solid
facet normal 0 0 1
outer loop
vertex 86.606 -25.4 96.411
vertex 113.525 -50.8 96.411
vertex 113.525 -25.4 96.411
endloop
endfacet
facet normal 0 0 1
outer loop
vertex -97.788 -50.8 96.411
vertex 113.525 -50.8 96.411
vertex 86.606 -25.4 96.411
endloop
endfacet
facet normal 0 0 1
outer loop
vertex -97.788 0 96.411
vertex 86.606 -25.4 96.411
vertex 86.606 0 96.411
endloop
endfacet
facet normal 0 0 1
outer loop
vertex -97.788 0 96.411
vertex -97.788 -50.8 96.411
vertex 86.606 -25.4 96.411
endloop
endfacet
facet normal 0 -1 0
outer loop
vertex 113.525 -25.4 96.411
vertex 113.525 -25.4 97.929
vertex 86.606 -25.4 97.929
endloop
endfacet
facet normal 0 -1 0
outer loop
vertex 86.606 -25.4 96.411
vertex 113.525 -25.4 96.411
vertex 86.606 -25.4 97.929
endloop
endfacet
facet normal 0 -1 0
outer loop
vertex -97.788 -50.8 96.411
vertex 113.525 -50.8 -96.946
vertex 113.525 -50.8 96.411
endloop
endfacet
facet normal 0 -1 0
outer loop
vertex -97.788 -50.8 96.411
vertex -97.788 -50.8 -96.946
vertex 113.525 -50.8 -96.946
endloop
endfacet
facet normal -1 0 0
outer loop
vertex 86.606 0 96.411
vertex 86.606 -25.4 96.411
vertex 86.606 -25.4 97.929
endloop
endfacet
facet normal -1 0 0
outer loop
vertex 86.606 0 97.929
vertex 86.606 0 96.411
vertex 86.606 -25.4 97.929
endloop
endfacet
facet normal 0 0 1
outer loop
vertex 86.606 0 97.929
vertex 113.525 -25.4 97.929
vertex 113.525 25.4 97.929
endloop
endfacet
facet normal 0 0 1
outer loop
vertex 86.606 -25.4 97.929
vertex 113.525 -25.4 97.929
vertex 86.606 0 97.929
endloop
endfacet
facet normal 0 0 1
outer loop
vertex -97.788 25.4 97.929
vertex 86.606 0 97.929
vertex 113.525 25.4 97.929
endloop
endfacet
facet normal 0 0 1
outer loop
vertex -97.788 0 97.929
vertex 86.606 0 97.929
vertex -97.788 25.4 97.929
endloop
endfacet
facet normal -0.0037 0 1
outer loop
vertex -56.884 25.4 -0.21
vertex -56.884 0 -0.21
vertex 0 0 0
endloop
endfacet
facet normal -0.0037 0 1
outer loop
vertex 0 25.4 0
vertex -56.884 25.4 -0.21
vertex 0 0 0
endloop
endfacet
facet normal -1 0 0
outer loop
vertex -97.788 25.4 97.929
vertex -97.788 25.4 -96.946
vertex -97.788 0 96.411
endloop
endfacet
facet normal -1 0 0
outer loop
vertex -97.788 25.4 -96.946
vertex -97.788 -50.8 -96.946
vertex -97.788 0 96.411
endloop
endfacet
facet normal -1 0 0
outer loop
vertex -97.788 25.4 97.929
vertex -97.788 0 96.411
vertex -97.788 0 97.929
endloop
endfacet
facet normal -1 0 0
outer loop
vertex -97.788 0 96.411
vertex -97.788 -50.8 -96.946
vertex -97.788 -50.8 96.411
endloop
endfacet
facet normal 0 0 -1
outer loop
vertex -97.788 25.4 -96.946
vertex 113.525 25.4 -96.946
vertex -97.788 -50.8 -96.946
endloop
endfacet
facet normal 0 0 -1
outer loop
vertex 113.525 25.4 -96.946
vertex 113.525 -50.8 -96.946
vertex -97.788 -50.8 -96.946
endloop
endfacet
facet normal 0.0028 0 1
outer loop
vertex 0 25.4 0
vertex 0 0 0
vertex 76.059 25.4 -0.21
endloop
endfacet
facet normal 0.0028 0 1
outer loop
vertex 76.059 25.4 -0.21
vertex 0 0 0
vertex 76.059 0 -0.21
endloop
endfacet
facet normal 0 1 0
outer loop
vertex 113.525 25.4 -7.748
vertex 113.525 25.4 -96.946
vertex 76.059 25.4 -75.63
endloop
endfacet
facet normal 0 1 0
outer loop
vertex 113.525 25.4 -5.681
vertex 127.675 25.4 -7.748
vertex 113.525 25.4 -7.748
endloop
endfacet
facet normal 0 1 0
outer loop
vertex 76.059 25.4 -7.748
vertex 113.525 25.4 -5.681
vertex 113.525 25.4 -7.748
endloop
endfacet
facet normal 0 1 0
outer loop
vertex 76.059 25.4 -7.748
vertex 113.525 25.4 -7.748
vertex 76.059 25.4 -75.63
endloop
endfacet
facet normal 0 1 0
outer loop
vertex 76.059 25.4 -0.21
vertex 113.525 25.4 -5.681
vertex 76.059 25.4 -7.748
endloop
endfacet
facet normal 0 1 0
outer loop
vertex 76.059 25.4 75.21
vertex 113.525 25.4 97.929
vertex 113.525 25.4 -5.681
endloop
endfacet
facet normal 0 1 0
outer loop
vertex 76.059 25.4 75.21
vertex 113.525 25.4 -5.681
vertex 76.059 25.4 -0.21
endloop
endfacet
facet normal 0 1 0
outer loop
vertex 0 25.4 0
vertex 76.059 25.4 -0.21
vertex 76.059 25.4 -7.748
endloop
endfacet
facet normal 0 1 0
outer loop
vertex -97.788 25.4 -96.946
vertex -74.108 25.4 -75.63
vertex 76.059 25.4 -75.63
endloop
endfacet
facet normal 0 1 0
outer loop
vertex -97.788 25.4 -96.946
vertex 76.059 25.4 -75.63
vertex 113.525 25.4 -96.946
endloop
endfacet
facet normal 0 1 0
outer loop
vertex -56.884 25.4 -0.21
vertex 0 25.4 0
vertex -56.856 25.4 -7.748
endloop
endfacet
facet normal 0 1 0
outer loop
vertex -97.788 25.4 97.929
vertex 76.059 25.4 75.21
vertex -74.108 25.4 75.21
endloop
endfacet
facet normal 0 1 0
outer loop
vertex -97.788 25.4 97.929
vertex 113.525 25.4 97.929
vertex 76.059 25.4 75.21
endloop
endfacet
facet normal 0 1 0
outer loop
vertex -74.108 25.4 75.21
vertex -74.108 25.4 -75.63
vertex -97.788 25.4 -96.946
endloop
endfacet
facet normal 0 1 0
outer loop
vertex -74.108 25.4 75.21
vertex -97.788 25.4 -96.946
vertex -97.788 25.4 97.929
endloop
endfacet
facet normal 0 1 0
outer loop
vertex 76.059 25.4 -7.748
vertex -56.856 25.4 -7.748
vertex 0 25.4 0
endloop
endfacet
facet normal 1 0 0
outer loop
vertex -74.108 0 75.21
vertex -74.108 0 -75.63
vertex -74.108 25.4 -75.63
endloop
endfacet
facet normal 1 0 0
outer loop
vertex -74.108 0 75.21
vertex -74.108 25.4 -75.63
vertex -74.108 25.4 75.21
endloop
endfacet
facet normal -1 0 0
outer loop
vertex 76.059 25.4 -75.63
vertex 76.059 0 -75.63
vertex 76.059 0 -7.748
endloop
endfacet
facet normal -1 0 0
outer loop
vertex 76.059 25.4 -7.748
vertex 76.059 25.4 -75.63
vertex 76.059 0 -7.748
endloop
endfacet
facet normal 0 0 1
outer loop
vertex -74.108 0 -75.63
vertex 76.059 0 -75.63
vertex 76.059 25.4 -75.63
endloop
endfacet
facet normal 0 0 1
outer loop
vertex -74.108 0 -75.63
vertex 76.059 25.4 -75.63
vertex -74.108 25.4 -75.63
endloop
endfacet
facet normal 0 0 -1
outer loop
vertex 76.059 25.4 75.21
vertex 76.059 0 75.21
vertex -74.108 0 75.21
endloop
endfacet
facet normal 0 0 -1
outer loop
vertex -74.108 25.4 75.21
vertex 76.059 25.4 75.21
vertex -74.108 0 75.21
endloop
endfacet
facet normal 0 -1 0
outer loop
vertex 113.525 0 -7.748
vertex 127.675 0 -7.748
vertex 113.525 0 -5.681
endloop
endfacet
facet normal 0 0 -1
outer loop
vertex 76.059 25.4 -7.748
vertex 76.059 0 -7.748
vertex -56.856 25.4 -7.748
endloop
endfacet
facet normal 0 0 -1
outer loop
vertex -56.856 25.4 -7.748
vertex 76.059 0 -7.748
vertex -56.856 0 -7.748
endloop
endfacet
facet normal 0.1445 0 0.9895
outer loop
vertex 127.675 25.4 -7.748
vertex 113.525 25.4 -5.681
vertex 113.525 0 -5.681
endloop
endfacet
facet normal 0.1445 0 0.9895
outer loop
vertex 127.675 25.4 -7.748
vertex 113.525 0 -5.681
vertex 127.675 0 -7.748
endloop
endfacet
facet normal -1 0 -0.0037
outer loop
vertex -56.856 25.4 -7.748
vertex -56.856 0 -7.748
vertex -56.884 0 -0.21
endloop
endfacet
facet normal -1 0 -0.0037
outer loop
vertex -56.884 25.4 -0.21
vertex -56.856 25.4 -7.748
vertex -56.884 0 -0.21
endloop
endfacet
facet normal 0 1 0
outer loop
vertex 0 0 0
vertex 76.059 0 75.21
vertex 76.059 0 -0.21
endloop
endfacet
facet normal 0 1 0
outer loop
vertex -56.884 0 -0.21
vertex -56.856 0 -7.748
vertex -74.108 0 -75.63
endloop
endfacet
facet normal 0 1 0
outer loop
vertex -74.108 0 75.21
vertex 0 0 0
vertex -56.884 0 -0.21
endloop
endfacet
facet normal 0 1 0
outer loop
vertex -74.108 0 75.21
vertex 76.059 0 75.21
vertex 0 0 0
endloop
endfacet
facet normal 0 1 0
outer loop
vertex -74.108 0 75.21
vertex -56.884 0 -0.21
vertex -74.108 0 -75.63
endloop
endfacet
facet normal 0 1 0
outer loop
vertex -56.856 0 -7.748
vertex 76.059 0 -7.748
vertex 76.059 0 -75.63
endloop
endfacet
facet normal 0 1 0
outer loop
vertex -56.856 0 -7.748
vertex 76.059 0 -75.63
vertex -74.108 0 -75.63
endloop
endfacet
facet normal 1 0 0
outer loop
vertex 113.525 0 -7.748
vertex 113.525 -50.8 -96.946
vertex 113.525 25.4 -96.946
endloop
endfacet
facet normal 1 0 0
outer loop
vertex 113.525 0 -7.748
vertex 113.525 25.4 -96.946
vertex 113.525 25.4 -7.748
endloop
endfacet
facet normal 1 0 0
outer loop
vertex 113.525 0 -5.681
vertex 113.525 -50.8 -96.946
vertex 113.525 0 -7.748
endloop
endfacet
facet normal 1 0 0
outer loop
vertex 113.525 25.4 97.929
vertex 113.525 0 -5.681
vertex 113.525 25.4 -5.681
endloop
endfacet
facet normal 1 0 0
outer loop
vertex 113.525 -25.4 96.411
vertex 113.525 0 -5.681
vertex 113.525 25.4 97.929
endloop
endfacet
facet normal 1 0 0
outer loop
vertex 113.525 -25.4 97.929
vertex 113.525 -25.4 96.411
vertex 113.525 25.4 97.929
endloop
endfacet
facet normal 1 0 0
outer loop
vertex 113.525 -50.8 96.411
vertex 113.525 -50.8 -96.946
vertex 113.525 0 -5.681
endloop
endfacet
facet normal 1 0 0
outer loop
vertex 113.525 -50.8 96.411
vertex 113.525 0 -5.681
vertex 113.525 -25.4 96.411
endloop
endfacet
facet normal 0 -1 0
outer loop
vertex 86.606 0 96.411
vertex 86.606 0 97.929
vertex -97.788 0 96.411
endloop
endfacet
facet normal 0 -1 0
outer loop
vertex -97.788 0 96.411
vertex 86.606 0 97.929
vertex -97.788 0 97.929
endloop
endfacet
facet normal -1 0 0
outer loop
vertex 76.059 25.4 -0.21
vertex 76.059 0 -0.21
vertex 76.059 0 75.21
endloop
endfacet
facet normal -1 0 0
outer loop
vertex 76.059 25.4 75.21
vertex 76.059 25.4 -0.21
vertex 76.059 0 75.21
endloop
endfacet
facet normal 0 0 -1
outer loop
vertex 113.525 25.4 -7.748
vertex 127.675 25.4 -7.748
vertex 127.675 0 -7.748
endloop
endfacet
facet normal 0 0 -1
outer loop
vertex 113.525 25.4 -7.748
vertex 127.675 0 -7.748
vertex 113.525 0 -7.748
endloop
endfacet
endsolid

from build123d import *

# Parameters (mm, degrees)
F0_W      = 193.780676
F0_H      = 193.357542
F1_DEPTH  = 25.4
F2_W      = 185.913056
F2_H      = 193.357542
F3_DEPTH  = 25.4
F4_W      = 25.4
F4_H      = 193.357542
F5_DEPTH  = 25.4
F6_W      = 26.91965
F6_H      = 194.875538
F7_DEPTH  = 25.4
F8_W      = 211.313056
F8_H      = 194.875538
F8_W_2    = 150.167435
F8_H_2    = 150.83959
F9_DEPTH  = 25.4
F11_DEPTH = 25.4


with BuildPart() as f1:
    # F0 (on Front) → F1 (new body)
    with BuildSketch(Plane.XZ):
        with Locations((-0.897467, -0.267394)):
            Rectangle(F0_W, F0_H)
    extrude(amount=F1_DEPTH)

    # F2 (on face) → F3 (join)
    with BuildSketch(Plane.XZ.offset(25.4)):
        with Locations((-4.831277, -0.267394)):
            Rectangle(F2_W, F2_H)
    extrude(amount=F3_DEPTH)

    # F4 (on face) → F5 (join)
    with BuildSketch(Plane.YZ.offset(88.125251)):
        with Locations((-38.1, -0.267394)):
            Rectangle(F4_W, F4_H)
    extrude(amount=F5_DEPTH)

    # F6 (on face) → F7 (join)
    with BuildSketch(Plane(origin=(0, -25.4, 0), x_dir=(-1, 0, 0), z_dir=(0, 1, 0))):
        with Locations((-100.065426, 0.491604)):
            Rectangle(F6_W, F6_H)
    extrude(amount=F7_DEPTH)

    # F8 (on face) → F9 (join)
    with BuildSketch(Plane(origin=(0, 0, 0), x_dir=(-1, 0, 0), z_dir=(0, 1, 0))):
        with Locations((-7.868723, 0.491604)):
            Rectangle(F8_W, F8_H)
        with Locations((-0.97549, -0.210028)):
            Rectangle(F8_W_2, F8_H_2, mode=Mode.SUBTRACT)
    extrude(amount=F9_DEPTH)

    # F10 (on face) → F11 (join)
    with BuildSketch(Plane(origin=(0, 0, 0), x_dir=(-1, 0, 0), z_dir=(0, 1, 0))):
        Polygon((56.883931, -0.210028), (0, 0), (-76.059207, -0.210028), (-127.674758, -7.74778), (56.8561, -7.74778), align=None)
    extrude(amount=F11_DEPTH)


solid = f1.part
